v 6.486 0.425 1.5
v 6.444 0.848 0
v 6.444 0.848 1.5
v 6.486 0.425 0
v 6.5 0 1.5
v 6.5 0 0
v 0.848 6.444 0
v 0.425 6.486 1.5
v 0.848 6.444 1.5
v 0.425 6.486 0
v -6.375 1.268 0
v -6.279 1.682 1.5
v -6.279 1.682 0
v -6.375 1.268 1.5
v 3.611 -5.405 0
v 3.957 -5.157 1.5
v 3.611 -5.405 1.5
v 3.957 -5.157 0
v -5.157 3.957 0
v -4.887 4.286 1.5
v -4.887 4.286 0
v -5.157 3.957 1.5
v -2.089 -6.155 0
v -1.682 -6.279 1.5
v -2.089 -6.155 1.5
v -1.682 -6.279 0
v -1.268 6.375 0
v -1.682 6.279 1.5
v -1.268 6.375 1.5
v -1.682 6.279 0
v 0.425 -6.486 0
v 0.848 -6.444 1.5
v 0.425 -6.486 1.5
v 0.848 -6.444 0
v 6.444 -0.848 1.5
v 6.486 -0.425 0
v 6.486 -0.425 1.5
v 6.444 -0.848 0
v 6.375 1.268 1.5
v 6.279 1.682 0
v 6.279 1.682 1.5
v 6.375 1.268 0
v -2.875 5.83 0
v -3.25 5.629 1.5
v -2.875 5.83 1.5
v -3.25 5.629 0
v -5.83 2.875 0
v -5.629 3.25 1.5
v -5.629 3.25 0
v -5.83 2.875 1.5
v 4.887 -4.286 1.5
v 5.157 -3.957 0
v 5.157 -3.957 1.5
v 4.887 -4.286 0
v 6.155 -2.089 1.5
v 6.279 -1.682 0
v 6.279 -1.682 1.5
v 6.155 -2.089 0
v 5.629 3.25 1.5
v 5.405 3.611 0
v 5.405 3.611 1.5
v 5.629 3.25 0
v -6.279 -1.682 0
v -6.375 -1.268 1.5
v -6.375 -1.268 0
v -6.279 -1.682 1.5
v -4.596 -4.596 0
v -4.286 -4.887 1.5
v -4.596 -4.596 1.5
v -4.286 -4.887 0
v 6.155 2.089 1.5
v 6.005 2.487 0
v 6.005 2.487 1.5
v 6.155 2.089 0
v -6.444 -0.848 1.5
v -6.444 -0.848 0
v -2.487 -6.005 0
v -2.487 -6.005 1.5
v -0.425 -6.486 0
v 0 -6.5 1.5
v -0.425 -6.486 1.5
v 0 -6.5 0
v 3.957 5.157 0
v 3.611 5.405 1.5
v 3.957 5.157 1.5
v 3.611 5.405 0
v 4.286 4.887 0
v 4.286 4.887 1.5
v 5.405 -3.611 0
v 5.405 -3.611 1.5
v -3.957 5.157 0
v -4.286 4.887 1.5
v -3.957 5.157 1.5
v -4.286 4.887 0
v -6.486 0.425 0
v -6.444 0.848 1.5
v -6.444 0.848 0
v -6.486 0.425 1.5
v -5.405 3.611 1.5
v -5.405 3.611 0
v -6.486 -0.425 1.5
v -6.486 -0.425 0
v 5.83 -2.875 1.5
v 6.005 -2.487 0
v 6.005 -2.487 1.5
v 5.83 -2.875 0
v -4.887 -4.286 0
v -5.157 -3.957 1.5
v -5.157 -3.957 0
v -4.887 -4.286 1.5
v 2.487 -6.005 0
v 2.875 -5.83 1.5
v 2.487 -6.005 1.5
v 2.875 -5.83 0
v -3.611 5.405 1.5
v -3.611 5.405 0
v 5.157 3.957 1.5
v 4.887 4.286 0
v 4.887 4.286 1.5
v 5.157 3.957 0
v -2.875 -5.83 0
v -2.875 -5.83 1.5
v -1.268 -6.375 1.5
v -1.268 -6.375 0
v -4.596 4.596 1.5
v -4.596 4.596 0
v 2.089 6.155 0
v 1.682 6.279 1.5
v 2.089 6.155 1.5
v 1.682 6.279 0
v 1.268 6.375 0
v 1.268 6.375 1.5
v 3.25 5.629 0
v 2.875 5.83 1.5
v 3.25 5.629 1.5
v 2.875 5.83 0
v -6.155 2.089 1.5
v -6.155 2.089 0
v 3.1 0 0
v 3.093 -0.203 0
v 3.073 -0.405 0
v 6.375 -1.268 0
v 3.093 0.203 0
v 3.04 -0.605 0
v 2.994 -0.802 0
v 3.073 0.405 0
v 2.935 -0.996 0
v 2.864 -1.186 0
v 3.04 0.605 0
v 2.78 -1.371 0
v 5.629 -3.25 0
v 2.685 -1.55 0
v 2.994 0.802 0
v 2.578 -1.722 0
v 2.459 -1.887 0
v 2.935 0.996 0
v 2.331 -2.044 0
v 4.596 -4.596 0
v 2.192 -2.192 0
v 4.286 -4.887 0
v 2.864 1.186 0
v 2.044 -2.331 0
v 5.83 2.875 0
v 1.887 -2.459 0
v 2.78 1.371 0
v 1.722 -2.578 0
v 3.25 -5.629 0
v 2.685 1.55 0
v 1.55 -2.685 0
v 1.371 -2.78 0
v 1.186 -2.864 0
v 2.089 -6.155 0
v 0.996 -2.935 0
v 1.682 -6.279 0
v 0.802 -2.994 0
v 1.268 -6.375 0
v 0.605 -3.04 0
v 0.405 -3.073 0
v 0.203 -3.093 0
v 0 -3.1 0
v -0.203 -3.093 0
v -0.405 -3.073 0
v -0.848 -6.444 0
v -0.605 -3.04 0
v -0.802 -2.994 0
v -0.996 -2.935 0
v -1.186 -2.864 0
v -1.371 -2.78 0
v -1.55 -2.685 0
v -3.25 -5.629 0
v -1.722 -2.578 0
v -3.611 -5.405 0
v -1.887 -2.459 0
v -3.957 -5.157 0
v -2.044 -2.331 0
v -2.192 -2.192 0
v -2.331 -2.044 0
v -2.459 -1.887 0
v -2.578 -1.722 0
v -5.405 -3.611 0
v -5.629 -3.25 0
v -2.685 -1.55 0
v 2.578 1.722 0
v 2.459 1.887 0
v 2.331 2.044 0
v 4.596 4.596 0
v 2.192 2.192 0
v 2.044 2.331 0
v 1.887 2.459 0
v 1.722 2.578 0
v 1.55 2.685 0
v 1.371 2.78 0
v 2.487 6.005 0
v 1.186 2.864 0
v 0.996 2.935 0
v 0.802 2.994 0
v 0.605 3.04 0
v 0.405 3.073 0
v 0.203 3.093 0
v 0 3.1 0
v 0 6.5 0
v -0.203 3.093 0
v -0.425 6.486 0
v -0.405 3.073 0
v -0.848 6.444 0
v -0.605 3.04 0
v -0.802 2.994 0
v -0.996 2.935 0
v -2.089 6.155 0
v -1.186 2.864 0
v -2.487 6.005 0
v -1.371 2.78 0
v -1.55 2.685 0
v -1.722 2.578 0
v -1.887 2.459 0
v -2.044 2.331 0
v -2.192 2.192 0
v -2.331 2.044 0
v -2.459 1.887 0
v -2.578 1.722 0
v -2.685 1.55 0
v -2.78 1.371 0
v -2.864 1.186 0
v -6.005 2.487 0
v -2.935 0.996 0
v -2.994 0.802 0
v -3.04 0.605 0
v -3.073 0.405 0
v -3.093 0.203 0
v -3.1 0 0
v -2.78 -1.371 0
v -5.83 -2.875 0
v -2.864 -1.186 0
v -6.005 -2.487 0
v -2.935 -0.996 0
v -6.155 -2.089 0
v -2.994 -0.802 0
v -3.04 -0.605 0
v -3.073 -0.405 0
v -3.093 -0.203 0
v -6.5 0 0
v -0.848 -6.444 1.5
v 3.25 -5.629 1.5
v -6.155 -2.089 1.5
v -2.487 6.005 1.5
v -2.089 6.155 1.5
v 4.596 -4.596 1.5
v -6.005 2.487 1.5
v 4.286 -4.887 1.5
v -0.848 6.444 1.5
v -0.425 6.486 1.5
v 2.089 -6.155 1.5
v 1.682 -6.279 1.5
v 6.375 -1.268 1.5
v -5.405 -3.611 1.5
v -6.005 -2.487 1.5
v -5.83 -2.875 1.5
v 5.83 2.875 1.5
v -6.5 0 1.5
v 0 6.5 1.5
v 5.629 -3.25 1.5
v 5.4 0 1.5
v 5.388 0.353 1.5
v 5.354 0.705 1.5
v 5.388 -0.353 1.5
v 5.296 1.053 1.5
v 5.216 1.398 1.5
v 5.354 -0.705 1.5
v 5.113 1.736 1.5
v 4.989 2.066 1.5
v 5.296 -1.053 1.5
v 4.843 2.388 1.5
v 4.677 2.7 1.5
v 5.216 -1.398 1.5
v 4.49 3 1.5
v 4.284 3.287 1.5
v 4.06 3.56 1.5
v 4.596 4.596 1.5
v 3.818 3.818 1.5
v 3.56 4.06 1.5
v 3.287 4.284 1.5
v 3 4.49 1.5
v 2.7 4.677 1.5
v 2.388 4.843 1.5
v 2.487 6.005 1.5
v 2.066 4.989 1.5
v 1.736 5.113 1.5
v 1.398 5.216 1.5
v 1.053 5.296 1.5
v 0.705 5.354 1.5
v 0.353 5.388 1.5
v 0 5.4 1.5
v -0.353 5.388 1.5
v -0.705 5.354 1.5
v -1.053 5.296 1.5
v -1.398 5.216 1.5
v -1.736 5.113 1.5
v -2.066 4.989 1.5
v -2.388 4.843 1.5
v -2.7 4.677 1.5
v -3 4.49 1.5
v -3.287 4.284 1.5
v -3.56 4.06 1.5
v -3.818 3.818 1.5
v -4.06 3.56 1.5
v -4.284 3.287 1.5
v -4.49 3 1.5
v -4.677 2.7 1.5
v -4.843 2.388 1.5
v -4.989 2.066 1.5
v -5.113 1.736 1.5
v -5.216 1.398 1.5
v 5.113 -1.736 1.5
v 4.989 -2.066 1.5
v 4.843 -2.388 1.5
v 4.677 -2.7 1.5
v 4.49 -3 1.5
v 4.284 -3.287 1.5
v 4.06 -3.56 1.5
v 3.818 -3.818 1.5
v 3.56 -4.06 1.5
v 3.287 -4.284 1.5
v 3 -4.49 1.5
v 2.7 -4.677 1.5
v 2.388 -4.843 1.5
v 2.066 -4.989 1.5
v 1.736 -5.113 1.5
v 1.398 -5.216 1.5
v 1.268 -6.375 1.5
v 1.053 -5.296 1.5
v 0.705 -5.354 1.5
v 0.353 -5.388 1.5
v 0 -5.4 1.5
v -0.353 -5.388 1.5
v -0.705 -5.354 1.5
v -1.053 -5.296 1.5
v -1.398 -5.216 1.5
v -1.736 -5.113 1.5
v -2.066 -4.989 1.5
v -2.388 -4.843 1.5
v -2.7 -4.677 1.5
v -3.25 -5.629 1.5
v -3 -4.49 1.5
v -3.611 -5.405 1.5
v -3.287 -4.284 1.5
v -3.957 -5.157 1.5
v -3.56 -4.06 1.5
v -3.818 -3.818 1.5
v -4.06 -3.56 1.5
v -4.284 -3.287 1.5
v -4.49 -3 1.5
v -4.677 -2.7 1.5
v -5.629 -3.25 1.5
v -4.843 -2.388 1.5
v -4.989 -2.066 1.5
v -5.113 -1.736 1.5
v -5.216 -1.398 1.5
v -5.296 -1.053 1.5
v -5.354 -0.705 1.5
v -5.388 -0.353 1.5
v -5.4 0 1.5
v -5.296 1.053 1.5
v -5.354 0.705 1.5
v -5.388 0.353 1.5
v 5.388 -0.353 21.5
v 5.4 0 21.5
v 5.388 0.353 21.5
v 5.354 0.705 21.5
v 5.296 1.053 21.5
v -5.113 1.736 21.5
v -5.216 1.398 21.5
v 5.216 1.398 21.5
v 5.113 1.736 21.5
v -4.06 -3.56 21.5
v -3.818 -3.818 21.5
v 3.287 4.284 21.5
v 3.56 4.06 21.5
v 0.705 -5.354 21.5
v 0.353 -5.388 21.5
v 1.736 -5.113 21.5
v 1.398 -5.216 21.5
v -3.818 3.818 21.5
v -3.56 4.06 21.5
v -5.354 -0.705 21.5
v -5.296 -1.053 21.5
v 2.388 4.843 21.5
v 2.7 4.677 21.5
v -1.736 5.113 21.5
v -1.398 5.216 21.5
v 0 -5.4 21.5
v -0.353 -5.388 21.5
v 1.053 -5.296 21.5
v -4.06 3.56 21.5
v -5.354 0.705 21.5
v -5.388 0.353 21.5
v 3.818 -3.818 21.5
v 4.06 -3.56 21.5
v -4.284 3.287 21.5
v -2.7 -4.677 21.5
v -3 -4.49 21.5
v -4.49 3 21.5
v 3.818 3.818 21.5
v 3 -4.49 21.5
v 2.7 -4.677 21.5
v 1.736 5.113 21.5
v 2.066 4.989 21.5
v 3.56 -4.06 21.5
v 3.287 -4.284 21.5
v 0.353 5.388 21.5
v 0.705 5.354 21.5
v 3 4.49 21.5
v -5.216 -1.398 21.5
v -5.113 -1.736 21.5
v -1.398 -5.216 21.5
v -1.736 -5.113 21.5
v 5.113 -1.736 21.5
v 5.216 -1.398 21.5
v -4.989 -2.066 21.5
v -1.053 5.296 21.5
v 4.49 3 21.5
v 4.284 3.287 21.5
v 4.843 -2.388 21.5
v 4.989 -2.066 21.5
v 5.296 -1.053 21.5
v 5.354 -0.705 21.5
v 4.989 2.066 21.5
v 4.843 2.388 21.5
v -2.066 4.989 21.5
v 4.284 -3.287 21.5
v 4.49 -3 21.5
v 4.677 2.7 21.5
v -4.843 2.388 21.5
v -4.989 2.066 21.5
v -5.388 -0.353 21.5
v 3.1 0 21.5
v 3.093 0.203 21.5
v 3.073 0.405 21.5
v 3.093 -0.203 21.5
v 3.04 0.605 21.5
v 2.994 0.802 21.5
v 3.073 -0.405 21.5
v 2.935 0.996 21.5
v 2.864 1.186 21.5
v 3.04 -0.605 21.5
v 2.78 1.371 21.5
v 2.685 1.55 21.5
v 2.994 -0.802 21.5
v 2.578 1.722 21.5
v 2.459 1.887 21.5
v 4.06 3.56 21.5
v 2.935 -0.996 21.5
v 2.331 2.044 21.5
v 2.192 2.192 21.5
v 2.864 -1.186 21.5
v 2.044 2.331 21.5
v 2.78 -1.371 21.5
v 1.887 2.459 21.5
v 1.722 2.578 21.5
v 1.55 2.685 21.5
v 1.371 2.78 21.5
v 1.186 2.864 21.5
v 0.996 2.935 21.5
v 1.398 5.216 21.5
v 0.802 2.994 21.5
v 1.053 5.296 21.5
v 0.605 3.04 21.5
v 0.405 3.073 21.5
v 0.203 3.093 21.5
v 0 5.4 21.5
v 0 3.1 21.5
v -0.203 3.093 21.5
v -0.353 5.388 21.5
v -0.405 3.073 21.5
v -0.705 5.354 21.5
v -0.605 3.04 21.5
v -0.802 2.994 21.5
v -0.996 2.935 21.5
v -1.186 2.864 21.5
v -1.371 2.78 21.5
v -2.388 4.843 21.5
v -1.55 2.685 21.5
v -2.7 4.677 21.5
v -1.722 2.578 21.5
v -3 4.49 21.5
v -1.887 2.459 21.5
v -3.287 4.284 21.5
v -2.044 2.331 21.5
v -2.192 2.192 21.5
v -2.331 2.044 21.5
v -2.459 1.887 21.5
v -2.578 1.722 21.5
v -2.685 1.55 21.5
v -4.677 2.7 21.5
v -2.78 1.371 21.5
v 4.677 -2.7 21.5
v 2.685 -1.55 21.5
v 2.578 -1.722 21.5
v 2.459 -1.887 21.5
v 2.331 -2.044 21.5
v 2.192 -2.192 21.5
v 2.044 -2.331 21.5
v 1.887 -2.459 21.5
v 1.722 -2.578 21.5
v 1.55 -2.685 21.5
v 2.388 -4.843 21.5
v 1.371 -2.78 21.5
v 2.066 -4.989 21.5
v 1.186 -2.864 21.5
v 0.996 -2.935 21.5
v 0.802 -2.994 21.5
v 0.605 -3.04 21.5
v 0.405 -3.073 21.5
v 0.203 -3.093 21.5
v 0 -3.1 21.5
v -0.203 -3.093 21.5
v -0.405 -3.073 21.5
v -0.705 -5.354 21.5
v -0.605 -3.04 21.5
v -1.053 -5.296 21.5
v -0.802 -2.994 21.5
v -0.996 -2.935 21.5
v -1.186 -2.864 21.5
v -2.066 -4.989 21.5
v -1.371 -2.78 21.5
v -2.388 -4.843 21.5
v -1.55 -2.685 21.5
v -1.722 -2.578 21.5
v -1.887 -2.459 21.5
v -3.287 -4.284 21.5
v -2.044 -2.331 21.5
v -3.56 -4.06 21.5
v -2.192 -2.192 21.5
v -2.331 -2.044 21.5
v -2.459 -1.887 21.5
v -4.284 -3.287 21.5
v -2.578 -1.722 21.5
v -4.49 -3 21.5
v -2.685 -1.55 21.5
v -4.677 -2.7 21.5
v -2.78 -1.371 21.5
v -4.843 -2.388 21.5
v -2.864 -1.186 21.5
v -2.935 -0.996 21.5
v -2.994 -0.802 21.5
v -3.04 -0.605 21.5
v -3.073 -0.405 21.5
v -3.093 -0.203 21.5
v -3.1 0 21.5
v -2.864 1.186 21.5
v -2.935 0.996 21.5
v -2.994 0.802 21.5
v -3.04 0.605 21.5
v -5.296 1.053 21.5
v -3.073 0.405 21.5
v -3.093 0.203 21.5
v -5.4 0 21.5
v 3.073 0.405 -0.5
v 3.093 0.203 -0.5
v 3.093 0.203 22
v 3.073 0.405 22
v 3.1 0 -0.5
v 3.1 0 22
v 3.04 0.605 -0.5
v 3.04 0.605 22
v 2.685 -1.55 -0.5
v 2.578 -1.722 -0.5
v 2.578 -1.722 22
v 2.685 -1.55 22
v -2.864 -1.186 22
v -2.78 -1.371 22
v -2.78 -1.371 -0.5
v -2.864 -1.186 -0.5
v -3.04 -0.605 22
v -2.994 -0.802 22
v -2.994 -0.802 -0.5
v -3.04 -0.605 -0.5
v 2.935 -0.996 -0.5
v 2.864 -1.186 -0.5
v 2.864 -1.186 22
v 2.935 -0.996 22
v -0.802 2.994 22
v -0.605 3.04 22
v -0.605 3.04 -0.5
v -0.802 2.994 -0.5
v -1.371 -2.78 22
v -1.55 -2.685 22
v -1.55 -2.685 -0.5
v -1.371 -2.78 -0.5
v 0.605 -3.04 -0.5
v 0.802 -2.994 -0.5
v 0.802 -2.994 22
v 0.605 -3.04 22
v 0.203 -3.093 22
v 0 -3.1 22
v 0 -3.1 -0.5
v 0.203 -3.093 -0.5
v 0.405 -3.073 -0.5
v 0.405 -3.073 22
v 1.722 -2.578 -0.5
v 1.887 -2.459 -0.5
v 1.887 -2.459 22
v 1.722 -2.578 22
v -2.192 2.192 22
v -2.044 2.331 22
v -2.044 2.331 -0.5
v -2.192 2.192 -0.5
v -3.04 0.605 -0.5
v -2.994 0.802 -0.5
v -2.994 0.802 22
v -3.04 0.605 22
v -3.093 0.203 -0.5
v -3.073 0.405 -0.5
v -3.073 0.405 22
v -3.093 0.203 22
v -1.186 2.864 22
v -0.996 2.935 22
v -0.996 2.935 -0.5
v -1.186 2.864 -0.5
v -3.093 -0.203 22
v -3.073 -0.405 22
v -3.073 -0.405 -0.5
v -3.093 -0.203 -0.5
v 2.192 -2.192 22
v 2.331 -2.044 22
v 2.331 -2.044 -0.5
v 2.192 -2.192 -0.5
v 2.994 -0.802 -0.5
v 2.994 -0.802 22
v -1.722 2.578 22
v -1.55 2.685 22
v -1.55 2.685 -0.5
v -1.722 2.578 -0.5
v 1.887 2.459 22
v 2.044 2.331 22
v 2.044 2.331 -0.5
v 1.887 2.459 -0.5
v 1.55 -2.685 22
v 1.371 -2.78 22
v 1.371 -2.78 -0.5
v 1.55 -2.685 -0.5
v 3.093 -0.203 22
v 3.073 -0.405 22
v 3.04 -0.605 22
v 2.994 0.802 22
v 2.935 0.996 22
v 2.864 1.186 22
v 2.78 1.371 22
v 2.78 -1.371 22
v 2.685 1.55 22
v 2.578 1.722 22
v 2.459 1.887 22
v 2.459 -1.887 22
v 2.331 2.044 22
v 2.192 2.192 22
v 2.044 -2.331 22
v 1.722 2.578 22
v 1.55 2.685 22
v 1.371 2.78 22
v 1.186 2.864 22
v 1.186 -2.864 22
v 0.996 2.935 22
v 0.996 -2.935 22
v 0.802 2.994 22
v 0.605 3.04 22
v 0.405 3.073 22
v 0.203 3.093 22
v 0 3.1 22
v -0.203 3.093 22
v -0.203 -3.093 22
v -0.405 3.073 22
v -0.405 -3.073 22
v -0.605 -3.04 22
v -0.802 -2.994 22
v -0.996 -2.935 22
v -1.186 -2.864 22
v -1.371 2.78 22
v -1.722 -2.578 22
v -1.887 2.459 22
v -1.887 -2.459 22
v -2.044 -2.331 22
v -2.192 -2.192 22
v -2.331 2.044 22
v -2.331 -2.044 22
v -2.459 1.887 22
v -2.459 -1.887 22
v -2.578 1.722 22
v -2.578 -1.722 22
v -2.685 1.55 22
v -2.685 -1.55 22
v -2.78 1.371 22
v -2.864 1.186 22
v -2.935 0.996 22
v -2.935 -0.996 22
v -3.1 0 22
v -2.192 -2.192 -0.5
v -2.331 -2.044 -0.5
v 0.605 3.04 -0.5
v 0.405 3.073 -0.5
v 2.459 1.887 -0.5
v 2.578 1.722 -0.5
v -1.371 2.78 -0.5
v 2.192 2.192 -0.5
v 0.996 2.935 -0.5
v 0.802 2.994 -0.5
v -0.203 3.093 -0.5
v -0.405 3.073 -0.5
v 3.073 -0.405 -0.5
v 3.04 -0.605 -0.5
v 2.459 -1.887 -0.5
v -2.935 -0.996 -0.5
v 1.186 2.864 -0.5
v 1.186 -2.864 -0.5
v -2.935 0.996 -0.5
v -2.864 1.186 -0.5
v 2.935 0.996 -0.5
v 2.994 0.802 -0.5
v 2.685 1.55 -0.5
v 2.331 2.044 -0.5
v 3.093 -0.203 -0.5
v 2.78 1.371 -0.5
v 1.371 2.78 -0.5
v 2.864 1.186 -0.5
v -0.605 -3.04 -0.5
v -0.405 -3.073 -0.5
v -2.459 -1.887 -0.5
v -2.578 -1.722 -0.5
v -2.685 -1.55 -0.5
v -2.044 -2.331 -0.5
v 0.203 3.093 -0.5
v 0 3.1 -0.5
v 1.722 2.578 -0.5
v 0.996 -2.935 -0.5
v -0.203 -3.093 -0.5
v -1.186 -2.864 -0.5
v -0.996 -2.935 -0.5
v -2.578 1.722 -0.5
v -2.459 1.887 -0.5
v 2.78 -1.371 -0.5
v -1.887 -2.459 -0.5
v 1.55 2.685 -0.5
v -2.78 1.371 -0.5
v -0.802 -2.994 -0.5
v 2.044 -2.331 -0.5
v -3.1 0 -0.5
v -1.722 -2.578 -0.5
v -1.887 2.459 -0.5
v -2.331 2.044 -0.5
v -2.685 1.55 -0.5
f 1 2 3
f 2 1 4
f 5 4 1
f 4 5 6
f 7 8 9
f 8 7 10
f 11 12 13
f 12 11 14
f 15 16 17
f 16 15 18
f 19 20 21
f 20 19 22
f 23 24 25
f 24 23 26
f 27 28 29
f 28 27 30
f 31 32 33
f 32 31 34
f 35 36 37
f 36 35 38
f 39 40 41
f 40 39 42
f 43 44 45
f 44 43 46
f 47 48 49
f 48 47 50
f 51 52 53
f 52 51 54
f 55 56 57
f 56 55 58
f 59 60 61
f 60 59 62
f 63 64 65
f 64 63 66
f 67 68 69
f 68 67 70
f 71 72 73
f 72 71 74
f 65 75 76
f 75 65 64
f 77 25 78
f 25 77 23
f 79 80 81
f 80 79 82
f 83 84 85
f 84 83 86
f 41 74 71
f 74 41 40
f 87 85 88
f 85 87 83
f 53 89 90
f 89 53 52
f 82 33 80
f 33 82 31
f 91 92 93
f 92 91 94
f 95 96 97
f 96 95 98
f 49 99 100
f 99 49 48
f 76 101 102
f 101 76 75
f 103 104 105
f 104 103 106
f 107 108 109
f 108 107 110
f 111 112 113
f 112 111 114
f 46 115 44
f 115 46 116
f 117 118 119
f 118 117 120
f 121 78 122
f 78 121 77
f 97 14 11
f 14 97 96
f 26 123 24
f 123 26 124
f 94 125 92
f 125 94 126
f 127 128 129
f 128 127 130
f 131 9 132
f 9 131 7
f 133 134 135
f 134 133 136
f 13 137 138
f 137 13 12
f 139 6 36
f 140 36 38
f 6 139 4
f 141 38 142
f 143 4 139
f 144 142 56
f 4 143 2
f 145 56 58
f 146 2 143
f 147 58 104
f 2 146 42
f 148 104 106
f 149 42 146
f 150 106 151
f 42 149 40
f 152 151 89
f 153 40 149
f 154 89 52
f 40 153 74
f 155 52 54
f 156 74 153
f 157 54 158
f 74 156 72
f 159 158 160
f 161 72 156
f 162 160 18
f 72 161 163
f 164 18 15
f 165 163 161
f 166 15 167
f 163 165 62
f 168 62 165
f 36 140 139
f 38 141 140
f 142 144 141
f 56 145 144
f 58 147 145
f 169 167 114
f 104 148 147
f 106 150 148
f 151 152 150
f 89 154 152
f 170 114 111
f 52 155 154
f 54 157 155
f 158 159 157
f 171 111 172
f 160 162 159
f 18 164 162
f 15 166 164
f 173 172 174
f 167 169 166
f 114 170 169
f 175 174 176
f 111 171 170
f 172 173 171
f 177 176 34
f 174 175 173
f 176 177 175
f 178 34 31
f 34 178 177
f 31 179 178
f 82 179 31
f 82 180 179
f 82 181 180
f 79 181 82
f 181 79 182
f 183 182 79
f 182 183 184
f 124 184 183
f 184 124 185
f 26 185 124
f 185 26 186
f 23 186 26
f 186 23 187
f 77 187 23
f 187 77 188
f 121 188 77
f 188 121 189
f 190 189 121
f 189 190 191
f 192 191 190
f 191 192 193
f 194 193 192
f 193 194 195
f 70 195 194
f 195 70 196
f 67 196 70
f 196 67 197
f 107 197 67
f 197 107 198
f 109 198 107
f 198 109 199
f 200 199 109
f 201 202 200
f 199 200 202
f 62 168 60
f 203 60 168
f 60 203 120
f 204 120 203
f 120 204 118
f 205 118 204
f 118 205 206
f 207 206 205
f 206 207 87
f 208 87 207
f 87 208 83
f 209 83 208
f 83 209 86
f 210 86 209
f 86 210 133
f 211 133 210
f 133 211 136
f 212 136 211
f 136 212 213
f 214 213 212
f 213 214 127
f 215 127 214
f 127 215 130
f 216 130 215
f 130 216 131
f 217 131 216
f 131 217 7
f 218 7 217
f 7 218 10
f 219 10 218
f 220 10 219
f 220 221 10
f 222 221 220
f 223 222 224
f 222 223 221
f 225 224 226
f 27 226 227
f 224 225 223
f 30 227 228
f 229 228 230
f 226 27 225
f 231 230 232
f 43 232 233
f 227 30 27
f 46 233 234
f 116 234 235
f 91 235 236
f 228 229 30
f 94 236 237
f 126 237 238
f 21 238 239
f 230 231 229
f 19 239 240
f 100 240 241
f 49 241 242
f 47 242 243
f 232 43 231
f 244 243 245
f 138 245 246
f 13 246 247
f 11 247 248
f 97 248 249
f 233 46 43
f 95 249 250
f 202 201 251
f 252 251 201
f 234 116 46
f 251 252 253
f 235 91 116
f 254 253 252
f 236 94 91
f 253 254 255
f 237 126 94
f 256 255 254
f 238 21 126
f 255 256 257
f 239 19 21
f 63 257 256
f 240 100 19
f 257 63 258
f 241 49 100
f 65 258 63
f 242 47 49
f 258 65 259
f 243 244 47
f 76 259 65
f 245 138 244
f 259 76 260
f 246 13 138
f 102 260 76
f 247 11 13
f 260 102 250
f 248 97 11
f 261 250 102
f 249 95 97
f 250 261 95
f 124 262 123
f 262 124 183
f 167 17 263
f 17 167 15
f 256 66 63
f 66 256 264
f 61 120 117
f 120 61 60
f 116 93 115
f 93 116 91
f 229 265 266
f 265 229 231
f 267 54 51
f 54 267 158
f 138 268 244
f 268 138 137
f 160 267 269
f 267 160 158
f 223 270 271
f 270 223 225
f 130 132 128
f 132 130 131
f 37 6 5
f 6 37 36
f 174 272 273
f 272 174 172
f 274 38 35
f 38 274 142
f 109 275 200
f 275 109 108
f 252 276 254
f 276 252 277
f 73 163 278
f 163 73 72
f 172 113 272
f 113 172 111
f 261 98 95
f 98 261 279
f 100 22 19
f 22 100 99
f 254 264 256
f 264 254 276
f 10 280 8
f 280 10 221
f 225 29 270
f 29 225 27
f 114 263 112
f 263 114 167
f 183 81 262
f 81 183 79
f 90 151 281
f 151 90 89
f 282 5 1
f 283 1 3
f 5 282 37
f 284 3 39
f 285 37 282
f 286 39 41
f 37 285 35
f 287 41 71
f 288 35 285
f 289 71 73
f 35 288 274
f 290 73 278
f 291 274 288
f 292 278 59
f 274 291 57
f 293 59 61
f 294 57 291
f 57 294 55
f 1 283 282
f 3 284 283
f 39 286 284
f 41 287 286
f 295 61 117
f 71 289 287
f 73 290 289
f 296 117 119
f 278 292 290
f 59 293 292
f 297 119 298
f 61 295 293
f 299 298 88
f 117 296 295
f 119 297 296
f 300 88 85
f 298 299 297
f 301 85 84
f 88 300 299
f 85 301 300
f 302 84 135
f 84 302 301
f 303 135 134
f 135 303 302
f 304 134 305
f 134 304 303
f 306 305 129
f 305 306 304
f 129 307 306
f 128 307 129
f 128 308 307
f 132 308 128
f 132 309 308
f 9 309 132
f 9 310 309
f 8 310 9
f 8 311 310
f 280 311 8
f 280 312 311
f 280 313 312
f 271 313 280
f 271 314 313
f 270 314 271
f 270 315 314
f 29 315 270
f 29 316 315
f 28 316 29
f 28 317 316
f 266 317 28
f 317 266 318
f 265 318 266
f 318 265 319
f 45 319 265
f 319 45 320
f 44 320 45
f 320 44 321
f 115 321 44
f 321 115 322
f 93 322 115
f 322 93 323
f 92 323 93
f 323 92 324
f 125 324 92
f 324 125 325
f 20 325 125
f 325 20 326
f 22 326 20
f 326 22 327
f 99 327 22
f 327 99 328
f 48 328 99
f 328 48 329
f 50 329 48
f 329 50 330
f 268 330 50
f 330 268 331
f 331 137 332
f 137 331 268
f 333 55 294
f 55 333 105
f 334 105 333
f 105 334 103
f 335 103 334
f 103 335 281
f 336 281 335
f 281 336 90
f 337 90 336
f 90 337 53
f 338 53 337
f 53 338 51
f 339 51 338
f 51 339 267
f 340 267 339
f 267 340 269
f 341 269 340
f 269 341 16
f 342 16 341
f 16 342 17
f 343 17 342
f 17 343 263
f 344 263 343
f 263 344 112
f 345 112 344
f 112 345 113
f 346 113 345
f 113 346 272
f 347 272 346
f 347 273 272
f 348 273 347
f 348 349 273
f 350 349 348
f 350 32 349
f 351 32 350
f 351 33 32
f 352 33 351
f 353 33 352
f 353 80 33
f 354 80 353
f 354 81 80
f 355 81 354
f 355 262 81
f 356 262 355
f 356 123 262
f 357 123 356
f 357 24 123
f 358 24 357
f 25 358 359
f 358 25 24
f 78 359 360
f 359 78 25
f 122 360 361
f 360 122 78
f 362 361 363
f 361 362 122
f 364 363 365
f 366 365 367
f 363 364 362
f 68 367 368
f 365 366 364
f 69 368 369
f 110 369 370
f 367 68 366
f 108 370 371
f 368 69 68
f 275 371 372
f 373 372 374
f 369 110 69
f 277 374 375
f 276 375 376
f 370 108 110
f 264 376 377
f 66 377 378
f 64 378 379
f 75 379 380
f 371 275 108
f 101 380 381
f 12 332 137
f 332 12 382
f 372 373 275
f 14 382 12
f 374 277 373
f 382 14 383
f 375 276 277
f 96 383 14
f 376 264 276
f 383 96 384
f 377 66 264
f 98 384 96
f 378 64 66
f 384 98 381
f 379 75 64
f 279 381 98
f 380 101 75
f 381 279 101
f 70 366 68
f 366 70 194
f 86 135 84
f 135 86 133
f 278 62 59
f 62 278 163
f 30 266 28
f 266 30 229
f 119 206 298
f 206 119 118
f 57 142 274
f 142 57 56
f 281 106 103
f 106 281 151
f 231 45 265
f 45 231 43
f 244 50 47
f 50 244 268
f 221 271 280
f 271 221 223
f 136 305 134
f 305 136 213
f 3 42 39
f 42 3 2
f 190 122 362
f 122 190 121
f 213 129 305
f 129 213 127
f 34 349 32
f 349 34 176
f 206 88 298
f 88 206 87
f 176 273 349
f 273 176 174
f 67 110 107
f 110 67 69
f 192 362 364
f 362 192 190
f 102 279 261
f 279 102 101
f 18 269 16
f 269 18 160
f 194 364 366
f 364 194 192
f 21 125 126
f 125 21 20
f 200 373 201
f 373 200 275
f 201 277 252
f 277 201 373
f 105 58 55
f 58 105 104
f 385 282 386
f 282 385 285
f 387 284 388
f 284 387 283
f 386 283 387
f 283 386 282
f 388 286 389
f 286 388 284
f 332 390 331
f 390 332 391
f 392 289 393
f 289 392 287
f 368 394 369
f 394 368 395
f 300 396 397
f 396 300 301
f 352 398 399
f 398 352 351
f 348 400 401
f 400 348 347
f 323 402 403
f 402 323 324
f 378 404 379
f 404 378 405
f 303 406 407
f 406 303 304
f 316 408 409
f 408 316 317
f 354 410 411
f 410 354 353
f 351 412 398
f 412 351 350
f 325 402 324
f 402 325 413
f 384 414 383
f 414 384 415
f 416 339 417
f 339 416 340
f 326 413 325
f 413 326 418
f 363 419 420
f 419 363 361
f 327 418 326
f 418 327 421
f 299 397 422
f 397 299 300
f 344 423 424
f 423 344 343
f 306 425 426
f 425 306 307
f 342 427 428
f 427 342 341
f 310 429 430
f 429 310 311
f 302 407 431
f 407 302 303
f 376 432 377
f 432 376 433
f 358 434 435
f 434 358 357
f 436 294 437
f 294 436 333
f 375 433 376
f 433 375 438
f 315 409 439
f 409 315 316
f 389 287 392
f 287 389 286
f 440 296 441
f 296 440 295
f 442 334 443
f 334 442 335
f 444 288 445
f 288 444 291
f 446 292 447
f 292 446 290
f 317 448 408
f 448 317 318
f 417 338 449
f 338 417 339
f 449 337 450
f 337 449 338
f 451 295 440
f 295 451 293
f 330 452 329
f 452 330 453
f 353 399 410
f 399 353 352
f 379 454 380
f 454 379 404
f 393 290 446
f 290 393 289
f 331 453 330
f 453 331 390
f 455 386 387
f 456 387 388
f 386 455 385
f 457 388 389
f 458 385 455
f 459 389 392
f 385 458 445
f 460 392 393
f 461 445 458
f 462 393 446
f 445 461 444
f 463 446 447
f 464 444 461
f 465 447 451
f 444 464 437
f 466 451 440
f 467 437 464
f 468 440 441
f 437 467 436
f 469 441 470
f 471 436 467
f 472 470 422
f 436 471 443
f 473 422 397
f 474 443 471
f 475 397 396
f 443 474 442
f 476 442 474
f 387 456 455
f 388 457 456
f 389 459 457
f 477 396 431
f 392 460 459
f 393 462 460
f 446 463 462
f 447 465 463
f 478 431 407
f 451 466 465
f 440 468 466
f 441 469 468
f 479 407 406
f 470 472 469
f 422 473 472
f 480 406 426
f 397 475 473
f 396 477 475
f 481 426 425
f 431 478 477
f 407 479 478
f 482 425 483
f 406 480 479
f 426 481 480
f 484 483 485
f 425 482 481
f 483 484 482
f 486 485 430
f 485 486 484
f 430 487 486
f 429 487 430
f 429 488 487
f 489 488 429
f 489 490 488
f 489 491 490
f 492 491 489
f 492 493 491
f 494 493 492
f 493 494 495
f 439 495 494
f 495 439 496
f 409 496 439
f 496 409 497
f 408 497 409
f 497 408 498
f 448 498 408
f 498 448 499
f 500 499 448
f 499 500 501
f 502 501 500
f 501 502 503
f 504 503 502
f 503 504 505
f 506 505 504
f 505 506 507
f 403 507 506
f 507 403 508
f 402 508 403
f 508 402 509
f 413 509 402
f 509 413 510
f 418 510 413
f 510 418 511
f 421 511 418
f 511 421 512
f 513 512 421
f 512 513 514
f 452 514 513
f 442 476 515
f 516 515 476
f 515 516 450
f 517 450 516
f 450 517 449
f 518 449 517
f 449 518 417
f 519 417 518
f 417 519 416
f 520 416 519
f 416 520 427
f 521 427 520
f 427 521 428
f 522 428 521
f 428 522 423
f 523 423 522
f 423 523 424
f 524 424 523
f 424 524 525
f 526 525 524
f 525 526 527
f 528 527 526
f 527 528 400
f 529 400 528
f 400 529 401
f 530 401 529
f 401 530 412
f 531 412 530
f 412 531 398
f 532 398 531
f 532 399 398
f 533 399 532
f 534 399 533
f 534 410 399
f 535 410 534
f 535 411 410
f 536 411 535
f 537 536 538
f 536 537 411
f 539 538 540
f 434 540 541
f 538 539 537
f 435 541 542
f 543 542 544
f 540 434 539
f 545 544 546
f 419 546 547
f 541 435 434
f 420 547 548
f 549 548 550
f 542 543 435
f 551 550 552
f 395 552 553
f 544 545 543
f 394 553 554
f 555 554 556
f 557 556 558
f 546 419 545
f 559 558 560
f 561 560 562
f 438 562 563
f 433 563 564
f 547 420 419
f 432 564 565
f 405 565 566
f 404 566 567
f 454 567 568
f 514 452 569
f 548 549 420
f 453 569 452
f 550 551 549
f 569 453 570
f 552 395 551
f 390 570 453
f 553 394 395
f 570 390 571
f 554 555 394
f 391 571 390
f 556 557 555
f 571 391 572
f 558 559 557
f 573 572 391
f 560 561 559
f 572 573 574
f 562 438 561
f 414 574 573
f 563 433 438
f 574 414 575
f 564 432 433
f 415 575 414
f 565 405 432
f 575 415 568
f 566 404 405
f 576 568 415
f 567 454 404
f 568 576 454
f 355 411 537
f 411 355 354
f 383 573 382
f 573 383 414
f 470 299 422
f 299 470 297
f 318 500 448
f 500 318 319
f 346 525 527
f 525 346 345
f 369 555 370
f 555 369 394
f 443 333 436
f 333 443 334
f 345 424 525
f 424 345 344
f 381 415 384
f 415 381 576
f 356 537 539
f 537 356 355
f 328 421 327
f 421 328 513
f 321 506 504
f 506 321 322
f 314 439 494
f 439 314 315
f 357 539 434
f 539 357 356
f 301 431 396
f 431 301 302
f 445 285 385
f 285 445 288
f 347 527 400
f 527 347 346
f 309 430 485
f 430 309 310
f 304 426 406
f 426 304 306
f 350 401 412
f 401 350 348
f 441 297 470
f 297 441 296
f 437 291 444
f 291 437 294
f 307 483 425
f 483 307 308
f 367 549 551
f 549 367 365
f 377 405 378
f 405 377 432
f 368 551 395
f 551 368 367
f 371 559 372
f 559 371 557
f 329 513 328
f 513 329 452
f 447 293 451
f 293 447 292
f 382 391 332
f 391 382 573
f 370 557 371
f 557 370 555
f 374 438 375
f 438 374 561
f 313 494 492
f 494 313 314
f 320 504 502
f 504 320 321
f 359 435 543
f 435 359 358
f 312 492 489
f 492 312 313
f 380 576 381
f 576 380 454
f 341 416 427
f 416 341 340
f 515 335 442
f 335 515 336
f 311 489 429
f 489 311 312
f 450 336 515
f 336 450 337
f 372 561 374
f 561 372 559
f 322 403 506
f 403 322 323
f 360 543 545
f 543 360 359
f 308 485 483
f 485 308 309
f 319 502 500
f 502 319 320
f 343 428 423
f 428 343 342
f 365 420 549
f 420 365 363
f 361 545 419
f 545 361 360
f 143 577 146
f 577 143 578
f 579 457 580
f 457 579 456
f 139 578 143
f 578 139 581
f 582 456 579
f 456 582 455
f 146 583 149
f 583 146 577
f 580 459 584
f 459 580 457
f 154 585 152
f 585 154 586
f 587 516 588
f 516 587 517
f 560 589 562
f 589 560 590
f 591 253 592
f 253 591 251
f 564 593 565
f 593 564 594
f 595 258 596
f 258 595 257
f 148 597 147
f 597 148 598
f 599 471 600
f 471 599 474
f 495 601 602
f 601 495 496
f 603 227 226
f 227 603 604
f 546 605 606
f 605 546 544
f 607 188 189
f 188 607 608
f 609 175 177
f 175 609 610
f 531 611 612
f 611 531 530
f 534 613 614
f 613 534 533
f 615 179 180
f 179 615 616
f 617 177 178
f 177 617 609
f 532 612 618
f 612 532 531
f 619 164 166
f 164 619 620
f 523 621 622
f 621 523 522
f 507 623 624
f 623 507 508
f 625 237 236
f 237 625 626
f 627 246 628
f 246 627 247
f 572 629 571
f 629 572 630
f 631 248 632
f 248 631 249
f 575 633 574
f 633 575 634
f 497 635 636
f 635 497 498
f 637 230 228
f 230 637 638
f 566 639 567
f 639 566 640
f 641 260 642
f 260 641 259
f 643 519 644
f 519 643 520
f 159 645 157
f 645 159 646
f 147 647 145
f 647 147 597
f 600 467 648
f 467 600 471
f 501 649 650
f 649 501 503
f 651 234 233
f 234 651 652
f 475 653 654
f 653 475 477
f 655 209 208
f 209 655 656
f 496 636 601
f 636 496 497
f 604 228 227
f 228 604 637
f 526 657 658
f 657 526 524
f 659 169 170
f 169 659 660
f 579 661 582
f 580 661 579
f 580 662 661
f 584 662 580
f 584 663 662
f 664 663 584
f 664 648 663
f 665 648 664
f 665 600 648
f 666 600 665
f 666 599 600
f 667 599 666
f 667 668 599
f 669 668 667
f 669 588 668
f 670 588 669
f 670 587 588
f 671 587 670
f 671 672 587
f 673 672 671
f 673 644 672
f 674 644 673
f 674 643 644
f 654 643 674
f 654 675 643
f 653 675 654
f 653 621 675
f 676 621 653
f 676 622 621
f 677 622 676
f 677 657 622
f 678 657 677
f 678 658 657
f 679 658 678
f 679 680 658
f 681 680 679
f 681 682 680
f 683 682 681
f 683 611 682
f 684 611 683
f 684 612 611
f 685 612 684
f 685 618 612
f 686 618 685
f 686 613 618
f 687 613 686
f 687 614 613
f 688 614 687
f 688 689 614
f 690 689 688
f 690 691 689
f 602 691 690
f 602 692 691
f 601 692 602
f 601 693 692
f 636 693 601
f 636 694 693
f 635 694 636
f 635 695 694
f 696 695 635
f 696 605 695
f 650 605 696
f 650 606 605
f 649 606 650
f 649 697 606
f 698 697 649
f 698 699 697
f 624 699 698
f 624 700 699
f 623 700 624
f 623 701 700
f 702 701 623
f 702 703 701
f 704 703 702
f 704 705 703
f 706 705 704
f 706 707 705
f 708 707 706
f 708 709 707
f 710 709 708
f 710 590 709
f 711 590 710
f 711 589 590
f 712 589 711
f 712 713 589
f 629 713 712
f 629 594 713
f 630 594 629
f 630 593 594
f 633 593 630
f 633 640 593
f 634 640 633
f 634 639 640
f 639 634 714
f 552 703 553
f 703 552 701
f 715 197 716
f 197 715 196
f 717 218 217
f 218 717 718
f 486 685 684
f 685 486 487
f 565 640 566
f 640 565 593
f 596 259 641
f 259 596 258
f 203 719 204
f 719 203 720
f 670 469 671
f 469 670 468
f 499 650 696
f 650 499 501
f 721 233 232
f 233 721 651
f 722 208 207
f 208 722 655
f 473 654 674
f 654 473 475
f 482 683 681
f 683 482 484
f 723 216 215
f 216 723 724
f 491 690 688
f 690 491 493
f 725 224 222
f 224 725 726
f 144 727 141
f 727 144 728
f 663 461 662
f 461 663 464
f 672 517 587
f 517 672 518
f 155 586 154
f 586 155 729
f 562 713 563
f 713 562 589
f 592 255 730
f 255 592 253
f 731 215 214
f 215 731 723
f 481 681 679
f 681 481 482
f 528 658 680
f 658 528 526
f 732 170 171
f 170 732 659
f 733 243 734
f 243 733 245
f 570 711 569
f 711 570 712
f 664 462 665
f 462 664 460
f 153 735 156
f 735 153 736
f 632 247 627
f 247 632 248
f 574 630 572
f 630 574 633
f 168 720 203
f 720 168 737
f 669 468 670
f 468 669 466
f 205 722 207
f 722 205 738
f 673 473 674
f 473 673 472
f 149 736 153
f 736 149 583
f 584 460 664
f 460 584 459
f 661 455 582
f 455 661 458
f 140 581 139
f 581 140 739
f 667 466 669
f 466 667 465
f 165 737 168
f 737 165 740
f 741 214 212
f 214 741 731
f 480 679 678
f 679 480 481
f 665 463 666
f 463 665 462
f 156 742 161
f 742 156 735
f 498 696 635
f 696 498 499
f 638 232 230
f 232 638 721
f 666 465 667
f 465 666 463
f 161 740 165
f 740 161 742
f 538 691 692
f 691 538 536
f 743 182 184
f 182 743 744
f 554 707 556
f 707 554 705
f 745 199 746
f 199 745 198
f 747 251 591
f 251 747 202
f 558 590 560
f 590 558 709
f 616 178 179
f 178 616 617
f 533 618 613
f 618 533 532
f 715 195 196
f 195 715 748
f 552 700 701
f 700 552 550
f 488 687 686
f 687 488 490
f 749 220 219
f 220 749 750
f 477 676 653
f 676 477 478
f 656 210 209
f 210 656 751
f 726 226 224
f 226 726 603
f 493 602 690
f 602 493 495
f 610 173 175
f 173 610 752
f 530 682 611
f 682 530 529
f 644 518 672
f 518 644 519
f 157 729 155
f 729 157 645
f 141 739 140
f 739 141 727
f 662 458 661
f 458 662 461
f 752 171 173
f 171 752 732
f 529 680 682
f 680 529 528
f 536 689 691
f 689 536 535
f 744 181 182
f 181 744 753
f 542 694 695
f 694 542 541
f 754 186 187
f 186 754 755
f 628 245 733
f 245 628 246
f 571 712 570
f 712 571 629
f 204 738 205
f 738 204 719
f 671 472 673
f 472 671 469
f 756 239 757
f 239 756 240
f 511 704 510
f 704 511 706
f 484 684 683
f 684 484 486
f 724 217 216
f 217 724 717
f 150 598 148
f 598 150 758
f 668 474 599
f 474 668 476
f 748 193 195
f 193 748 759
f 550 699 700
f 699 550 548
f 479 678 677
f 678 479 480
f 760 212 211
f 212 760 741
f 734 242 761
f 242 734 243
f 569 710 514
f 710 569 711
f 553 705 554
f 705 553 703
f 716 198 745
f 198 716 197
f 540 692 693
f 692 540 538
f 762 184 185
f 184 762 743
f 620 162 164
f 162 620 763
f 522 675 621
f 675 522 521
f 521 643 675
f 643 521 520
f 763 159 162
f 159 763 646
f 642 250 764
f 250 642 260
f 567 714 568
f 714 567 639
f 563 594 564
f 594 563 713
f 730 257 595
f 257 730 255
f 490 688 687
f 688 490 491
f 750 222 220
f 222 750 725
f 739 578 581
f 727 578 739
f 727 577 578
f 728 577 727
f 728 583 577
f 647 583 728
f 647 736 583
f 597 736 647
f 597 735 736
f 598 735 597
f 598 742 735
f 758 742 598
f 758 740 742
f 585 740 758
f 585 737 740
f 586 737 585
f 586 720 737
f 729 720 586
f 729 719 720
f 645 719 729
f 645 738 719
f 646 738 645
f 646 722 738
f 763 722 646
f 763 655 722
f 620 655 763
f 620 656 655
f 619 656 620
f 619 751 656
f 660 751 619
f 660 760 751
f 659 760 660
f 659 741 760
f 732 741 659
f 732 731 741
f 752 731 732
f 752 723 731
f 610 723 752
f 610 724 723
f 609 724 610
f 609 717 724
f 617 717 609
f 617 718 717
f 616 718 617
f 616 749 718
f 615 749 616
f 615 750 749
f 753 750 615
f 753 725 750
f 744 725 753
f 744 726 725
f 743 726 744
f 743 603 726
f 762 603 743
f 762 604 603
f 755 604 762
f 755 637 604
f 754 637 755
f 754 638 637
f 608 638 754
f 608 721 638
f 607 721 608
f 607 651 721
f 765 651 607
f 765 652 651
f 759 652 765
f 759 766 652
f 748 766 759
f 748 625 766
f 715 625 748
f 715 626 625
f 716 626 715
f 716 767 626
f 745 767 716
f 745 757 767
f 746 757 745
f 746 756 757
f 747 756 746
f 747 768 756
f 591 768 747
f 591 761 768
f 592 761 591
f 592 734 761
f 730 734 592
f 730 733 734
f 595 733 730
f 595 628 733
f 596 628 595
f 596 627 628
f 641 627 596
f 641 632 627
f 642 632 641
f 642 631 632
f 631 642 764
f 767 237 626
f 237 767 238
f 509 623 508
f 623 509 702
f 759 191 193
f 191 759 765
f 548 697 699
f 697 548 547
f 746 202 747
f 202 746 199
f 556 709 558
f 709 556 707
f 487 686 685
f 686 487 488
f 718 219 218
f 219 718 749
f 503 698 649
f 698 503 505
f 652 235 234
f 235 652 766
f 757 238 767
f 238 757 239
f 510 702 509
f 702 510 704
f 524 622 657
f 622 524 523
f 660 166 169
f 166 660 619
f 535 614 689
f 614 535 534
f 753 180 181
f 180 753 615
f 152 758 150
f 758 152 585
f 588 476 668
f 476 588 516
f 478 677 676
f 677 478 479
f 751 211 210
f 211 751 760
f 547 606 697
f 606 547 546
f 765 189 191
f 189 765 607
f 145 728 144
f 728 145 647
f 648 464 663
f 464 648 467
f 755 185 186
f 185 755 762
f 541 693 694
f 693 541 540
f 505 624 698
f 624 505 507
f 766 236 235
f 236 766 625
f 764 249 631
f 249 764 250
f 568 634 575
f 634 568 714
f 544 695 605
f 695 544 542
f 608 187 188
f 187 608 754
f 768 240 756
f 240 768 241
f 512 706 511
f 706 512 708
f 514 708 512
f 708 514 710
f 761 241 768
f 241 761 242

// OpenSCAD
// PCR tube adapter sleeve - print upside down
// Units: mm

// ---- Dimensions ----
collar_d        = 13;    // collar outer diameter
collar_t        = 1.5;   // collar thickness (z = 0 to 1.5)
sleeve_od       = 10.8;  // sleeve outer diameter
sleeve_h        = 20;    // sleeve body height above collar (z = 1.5 to 21.5)
bore_d          = 6.2;   // straight through-bore diameter
eps             = 0.5;   // cutter overshoot past faces

$fn = 96;

// ---- Model ----
union() {
    // Collar lying on the bed
    cylinder(d = collar_d, h = collar_t);

    // Sleeve body rising from the collar top
    translate([0, 0, collar_t])
        cylinder(d = sleeve_od, h = sleeve_h);
}

// Full-height bore, open at both ends
translate([0, 0, -eps])
    cylinder(d = bore_d, h = collar_t + sleeve_h + 2 * eps);
